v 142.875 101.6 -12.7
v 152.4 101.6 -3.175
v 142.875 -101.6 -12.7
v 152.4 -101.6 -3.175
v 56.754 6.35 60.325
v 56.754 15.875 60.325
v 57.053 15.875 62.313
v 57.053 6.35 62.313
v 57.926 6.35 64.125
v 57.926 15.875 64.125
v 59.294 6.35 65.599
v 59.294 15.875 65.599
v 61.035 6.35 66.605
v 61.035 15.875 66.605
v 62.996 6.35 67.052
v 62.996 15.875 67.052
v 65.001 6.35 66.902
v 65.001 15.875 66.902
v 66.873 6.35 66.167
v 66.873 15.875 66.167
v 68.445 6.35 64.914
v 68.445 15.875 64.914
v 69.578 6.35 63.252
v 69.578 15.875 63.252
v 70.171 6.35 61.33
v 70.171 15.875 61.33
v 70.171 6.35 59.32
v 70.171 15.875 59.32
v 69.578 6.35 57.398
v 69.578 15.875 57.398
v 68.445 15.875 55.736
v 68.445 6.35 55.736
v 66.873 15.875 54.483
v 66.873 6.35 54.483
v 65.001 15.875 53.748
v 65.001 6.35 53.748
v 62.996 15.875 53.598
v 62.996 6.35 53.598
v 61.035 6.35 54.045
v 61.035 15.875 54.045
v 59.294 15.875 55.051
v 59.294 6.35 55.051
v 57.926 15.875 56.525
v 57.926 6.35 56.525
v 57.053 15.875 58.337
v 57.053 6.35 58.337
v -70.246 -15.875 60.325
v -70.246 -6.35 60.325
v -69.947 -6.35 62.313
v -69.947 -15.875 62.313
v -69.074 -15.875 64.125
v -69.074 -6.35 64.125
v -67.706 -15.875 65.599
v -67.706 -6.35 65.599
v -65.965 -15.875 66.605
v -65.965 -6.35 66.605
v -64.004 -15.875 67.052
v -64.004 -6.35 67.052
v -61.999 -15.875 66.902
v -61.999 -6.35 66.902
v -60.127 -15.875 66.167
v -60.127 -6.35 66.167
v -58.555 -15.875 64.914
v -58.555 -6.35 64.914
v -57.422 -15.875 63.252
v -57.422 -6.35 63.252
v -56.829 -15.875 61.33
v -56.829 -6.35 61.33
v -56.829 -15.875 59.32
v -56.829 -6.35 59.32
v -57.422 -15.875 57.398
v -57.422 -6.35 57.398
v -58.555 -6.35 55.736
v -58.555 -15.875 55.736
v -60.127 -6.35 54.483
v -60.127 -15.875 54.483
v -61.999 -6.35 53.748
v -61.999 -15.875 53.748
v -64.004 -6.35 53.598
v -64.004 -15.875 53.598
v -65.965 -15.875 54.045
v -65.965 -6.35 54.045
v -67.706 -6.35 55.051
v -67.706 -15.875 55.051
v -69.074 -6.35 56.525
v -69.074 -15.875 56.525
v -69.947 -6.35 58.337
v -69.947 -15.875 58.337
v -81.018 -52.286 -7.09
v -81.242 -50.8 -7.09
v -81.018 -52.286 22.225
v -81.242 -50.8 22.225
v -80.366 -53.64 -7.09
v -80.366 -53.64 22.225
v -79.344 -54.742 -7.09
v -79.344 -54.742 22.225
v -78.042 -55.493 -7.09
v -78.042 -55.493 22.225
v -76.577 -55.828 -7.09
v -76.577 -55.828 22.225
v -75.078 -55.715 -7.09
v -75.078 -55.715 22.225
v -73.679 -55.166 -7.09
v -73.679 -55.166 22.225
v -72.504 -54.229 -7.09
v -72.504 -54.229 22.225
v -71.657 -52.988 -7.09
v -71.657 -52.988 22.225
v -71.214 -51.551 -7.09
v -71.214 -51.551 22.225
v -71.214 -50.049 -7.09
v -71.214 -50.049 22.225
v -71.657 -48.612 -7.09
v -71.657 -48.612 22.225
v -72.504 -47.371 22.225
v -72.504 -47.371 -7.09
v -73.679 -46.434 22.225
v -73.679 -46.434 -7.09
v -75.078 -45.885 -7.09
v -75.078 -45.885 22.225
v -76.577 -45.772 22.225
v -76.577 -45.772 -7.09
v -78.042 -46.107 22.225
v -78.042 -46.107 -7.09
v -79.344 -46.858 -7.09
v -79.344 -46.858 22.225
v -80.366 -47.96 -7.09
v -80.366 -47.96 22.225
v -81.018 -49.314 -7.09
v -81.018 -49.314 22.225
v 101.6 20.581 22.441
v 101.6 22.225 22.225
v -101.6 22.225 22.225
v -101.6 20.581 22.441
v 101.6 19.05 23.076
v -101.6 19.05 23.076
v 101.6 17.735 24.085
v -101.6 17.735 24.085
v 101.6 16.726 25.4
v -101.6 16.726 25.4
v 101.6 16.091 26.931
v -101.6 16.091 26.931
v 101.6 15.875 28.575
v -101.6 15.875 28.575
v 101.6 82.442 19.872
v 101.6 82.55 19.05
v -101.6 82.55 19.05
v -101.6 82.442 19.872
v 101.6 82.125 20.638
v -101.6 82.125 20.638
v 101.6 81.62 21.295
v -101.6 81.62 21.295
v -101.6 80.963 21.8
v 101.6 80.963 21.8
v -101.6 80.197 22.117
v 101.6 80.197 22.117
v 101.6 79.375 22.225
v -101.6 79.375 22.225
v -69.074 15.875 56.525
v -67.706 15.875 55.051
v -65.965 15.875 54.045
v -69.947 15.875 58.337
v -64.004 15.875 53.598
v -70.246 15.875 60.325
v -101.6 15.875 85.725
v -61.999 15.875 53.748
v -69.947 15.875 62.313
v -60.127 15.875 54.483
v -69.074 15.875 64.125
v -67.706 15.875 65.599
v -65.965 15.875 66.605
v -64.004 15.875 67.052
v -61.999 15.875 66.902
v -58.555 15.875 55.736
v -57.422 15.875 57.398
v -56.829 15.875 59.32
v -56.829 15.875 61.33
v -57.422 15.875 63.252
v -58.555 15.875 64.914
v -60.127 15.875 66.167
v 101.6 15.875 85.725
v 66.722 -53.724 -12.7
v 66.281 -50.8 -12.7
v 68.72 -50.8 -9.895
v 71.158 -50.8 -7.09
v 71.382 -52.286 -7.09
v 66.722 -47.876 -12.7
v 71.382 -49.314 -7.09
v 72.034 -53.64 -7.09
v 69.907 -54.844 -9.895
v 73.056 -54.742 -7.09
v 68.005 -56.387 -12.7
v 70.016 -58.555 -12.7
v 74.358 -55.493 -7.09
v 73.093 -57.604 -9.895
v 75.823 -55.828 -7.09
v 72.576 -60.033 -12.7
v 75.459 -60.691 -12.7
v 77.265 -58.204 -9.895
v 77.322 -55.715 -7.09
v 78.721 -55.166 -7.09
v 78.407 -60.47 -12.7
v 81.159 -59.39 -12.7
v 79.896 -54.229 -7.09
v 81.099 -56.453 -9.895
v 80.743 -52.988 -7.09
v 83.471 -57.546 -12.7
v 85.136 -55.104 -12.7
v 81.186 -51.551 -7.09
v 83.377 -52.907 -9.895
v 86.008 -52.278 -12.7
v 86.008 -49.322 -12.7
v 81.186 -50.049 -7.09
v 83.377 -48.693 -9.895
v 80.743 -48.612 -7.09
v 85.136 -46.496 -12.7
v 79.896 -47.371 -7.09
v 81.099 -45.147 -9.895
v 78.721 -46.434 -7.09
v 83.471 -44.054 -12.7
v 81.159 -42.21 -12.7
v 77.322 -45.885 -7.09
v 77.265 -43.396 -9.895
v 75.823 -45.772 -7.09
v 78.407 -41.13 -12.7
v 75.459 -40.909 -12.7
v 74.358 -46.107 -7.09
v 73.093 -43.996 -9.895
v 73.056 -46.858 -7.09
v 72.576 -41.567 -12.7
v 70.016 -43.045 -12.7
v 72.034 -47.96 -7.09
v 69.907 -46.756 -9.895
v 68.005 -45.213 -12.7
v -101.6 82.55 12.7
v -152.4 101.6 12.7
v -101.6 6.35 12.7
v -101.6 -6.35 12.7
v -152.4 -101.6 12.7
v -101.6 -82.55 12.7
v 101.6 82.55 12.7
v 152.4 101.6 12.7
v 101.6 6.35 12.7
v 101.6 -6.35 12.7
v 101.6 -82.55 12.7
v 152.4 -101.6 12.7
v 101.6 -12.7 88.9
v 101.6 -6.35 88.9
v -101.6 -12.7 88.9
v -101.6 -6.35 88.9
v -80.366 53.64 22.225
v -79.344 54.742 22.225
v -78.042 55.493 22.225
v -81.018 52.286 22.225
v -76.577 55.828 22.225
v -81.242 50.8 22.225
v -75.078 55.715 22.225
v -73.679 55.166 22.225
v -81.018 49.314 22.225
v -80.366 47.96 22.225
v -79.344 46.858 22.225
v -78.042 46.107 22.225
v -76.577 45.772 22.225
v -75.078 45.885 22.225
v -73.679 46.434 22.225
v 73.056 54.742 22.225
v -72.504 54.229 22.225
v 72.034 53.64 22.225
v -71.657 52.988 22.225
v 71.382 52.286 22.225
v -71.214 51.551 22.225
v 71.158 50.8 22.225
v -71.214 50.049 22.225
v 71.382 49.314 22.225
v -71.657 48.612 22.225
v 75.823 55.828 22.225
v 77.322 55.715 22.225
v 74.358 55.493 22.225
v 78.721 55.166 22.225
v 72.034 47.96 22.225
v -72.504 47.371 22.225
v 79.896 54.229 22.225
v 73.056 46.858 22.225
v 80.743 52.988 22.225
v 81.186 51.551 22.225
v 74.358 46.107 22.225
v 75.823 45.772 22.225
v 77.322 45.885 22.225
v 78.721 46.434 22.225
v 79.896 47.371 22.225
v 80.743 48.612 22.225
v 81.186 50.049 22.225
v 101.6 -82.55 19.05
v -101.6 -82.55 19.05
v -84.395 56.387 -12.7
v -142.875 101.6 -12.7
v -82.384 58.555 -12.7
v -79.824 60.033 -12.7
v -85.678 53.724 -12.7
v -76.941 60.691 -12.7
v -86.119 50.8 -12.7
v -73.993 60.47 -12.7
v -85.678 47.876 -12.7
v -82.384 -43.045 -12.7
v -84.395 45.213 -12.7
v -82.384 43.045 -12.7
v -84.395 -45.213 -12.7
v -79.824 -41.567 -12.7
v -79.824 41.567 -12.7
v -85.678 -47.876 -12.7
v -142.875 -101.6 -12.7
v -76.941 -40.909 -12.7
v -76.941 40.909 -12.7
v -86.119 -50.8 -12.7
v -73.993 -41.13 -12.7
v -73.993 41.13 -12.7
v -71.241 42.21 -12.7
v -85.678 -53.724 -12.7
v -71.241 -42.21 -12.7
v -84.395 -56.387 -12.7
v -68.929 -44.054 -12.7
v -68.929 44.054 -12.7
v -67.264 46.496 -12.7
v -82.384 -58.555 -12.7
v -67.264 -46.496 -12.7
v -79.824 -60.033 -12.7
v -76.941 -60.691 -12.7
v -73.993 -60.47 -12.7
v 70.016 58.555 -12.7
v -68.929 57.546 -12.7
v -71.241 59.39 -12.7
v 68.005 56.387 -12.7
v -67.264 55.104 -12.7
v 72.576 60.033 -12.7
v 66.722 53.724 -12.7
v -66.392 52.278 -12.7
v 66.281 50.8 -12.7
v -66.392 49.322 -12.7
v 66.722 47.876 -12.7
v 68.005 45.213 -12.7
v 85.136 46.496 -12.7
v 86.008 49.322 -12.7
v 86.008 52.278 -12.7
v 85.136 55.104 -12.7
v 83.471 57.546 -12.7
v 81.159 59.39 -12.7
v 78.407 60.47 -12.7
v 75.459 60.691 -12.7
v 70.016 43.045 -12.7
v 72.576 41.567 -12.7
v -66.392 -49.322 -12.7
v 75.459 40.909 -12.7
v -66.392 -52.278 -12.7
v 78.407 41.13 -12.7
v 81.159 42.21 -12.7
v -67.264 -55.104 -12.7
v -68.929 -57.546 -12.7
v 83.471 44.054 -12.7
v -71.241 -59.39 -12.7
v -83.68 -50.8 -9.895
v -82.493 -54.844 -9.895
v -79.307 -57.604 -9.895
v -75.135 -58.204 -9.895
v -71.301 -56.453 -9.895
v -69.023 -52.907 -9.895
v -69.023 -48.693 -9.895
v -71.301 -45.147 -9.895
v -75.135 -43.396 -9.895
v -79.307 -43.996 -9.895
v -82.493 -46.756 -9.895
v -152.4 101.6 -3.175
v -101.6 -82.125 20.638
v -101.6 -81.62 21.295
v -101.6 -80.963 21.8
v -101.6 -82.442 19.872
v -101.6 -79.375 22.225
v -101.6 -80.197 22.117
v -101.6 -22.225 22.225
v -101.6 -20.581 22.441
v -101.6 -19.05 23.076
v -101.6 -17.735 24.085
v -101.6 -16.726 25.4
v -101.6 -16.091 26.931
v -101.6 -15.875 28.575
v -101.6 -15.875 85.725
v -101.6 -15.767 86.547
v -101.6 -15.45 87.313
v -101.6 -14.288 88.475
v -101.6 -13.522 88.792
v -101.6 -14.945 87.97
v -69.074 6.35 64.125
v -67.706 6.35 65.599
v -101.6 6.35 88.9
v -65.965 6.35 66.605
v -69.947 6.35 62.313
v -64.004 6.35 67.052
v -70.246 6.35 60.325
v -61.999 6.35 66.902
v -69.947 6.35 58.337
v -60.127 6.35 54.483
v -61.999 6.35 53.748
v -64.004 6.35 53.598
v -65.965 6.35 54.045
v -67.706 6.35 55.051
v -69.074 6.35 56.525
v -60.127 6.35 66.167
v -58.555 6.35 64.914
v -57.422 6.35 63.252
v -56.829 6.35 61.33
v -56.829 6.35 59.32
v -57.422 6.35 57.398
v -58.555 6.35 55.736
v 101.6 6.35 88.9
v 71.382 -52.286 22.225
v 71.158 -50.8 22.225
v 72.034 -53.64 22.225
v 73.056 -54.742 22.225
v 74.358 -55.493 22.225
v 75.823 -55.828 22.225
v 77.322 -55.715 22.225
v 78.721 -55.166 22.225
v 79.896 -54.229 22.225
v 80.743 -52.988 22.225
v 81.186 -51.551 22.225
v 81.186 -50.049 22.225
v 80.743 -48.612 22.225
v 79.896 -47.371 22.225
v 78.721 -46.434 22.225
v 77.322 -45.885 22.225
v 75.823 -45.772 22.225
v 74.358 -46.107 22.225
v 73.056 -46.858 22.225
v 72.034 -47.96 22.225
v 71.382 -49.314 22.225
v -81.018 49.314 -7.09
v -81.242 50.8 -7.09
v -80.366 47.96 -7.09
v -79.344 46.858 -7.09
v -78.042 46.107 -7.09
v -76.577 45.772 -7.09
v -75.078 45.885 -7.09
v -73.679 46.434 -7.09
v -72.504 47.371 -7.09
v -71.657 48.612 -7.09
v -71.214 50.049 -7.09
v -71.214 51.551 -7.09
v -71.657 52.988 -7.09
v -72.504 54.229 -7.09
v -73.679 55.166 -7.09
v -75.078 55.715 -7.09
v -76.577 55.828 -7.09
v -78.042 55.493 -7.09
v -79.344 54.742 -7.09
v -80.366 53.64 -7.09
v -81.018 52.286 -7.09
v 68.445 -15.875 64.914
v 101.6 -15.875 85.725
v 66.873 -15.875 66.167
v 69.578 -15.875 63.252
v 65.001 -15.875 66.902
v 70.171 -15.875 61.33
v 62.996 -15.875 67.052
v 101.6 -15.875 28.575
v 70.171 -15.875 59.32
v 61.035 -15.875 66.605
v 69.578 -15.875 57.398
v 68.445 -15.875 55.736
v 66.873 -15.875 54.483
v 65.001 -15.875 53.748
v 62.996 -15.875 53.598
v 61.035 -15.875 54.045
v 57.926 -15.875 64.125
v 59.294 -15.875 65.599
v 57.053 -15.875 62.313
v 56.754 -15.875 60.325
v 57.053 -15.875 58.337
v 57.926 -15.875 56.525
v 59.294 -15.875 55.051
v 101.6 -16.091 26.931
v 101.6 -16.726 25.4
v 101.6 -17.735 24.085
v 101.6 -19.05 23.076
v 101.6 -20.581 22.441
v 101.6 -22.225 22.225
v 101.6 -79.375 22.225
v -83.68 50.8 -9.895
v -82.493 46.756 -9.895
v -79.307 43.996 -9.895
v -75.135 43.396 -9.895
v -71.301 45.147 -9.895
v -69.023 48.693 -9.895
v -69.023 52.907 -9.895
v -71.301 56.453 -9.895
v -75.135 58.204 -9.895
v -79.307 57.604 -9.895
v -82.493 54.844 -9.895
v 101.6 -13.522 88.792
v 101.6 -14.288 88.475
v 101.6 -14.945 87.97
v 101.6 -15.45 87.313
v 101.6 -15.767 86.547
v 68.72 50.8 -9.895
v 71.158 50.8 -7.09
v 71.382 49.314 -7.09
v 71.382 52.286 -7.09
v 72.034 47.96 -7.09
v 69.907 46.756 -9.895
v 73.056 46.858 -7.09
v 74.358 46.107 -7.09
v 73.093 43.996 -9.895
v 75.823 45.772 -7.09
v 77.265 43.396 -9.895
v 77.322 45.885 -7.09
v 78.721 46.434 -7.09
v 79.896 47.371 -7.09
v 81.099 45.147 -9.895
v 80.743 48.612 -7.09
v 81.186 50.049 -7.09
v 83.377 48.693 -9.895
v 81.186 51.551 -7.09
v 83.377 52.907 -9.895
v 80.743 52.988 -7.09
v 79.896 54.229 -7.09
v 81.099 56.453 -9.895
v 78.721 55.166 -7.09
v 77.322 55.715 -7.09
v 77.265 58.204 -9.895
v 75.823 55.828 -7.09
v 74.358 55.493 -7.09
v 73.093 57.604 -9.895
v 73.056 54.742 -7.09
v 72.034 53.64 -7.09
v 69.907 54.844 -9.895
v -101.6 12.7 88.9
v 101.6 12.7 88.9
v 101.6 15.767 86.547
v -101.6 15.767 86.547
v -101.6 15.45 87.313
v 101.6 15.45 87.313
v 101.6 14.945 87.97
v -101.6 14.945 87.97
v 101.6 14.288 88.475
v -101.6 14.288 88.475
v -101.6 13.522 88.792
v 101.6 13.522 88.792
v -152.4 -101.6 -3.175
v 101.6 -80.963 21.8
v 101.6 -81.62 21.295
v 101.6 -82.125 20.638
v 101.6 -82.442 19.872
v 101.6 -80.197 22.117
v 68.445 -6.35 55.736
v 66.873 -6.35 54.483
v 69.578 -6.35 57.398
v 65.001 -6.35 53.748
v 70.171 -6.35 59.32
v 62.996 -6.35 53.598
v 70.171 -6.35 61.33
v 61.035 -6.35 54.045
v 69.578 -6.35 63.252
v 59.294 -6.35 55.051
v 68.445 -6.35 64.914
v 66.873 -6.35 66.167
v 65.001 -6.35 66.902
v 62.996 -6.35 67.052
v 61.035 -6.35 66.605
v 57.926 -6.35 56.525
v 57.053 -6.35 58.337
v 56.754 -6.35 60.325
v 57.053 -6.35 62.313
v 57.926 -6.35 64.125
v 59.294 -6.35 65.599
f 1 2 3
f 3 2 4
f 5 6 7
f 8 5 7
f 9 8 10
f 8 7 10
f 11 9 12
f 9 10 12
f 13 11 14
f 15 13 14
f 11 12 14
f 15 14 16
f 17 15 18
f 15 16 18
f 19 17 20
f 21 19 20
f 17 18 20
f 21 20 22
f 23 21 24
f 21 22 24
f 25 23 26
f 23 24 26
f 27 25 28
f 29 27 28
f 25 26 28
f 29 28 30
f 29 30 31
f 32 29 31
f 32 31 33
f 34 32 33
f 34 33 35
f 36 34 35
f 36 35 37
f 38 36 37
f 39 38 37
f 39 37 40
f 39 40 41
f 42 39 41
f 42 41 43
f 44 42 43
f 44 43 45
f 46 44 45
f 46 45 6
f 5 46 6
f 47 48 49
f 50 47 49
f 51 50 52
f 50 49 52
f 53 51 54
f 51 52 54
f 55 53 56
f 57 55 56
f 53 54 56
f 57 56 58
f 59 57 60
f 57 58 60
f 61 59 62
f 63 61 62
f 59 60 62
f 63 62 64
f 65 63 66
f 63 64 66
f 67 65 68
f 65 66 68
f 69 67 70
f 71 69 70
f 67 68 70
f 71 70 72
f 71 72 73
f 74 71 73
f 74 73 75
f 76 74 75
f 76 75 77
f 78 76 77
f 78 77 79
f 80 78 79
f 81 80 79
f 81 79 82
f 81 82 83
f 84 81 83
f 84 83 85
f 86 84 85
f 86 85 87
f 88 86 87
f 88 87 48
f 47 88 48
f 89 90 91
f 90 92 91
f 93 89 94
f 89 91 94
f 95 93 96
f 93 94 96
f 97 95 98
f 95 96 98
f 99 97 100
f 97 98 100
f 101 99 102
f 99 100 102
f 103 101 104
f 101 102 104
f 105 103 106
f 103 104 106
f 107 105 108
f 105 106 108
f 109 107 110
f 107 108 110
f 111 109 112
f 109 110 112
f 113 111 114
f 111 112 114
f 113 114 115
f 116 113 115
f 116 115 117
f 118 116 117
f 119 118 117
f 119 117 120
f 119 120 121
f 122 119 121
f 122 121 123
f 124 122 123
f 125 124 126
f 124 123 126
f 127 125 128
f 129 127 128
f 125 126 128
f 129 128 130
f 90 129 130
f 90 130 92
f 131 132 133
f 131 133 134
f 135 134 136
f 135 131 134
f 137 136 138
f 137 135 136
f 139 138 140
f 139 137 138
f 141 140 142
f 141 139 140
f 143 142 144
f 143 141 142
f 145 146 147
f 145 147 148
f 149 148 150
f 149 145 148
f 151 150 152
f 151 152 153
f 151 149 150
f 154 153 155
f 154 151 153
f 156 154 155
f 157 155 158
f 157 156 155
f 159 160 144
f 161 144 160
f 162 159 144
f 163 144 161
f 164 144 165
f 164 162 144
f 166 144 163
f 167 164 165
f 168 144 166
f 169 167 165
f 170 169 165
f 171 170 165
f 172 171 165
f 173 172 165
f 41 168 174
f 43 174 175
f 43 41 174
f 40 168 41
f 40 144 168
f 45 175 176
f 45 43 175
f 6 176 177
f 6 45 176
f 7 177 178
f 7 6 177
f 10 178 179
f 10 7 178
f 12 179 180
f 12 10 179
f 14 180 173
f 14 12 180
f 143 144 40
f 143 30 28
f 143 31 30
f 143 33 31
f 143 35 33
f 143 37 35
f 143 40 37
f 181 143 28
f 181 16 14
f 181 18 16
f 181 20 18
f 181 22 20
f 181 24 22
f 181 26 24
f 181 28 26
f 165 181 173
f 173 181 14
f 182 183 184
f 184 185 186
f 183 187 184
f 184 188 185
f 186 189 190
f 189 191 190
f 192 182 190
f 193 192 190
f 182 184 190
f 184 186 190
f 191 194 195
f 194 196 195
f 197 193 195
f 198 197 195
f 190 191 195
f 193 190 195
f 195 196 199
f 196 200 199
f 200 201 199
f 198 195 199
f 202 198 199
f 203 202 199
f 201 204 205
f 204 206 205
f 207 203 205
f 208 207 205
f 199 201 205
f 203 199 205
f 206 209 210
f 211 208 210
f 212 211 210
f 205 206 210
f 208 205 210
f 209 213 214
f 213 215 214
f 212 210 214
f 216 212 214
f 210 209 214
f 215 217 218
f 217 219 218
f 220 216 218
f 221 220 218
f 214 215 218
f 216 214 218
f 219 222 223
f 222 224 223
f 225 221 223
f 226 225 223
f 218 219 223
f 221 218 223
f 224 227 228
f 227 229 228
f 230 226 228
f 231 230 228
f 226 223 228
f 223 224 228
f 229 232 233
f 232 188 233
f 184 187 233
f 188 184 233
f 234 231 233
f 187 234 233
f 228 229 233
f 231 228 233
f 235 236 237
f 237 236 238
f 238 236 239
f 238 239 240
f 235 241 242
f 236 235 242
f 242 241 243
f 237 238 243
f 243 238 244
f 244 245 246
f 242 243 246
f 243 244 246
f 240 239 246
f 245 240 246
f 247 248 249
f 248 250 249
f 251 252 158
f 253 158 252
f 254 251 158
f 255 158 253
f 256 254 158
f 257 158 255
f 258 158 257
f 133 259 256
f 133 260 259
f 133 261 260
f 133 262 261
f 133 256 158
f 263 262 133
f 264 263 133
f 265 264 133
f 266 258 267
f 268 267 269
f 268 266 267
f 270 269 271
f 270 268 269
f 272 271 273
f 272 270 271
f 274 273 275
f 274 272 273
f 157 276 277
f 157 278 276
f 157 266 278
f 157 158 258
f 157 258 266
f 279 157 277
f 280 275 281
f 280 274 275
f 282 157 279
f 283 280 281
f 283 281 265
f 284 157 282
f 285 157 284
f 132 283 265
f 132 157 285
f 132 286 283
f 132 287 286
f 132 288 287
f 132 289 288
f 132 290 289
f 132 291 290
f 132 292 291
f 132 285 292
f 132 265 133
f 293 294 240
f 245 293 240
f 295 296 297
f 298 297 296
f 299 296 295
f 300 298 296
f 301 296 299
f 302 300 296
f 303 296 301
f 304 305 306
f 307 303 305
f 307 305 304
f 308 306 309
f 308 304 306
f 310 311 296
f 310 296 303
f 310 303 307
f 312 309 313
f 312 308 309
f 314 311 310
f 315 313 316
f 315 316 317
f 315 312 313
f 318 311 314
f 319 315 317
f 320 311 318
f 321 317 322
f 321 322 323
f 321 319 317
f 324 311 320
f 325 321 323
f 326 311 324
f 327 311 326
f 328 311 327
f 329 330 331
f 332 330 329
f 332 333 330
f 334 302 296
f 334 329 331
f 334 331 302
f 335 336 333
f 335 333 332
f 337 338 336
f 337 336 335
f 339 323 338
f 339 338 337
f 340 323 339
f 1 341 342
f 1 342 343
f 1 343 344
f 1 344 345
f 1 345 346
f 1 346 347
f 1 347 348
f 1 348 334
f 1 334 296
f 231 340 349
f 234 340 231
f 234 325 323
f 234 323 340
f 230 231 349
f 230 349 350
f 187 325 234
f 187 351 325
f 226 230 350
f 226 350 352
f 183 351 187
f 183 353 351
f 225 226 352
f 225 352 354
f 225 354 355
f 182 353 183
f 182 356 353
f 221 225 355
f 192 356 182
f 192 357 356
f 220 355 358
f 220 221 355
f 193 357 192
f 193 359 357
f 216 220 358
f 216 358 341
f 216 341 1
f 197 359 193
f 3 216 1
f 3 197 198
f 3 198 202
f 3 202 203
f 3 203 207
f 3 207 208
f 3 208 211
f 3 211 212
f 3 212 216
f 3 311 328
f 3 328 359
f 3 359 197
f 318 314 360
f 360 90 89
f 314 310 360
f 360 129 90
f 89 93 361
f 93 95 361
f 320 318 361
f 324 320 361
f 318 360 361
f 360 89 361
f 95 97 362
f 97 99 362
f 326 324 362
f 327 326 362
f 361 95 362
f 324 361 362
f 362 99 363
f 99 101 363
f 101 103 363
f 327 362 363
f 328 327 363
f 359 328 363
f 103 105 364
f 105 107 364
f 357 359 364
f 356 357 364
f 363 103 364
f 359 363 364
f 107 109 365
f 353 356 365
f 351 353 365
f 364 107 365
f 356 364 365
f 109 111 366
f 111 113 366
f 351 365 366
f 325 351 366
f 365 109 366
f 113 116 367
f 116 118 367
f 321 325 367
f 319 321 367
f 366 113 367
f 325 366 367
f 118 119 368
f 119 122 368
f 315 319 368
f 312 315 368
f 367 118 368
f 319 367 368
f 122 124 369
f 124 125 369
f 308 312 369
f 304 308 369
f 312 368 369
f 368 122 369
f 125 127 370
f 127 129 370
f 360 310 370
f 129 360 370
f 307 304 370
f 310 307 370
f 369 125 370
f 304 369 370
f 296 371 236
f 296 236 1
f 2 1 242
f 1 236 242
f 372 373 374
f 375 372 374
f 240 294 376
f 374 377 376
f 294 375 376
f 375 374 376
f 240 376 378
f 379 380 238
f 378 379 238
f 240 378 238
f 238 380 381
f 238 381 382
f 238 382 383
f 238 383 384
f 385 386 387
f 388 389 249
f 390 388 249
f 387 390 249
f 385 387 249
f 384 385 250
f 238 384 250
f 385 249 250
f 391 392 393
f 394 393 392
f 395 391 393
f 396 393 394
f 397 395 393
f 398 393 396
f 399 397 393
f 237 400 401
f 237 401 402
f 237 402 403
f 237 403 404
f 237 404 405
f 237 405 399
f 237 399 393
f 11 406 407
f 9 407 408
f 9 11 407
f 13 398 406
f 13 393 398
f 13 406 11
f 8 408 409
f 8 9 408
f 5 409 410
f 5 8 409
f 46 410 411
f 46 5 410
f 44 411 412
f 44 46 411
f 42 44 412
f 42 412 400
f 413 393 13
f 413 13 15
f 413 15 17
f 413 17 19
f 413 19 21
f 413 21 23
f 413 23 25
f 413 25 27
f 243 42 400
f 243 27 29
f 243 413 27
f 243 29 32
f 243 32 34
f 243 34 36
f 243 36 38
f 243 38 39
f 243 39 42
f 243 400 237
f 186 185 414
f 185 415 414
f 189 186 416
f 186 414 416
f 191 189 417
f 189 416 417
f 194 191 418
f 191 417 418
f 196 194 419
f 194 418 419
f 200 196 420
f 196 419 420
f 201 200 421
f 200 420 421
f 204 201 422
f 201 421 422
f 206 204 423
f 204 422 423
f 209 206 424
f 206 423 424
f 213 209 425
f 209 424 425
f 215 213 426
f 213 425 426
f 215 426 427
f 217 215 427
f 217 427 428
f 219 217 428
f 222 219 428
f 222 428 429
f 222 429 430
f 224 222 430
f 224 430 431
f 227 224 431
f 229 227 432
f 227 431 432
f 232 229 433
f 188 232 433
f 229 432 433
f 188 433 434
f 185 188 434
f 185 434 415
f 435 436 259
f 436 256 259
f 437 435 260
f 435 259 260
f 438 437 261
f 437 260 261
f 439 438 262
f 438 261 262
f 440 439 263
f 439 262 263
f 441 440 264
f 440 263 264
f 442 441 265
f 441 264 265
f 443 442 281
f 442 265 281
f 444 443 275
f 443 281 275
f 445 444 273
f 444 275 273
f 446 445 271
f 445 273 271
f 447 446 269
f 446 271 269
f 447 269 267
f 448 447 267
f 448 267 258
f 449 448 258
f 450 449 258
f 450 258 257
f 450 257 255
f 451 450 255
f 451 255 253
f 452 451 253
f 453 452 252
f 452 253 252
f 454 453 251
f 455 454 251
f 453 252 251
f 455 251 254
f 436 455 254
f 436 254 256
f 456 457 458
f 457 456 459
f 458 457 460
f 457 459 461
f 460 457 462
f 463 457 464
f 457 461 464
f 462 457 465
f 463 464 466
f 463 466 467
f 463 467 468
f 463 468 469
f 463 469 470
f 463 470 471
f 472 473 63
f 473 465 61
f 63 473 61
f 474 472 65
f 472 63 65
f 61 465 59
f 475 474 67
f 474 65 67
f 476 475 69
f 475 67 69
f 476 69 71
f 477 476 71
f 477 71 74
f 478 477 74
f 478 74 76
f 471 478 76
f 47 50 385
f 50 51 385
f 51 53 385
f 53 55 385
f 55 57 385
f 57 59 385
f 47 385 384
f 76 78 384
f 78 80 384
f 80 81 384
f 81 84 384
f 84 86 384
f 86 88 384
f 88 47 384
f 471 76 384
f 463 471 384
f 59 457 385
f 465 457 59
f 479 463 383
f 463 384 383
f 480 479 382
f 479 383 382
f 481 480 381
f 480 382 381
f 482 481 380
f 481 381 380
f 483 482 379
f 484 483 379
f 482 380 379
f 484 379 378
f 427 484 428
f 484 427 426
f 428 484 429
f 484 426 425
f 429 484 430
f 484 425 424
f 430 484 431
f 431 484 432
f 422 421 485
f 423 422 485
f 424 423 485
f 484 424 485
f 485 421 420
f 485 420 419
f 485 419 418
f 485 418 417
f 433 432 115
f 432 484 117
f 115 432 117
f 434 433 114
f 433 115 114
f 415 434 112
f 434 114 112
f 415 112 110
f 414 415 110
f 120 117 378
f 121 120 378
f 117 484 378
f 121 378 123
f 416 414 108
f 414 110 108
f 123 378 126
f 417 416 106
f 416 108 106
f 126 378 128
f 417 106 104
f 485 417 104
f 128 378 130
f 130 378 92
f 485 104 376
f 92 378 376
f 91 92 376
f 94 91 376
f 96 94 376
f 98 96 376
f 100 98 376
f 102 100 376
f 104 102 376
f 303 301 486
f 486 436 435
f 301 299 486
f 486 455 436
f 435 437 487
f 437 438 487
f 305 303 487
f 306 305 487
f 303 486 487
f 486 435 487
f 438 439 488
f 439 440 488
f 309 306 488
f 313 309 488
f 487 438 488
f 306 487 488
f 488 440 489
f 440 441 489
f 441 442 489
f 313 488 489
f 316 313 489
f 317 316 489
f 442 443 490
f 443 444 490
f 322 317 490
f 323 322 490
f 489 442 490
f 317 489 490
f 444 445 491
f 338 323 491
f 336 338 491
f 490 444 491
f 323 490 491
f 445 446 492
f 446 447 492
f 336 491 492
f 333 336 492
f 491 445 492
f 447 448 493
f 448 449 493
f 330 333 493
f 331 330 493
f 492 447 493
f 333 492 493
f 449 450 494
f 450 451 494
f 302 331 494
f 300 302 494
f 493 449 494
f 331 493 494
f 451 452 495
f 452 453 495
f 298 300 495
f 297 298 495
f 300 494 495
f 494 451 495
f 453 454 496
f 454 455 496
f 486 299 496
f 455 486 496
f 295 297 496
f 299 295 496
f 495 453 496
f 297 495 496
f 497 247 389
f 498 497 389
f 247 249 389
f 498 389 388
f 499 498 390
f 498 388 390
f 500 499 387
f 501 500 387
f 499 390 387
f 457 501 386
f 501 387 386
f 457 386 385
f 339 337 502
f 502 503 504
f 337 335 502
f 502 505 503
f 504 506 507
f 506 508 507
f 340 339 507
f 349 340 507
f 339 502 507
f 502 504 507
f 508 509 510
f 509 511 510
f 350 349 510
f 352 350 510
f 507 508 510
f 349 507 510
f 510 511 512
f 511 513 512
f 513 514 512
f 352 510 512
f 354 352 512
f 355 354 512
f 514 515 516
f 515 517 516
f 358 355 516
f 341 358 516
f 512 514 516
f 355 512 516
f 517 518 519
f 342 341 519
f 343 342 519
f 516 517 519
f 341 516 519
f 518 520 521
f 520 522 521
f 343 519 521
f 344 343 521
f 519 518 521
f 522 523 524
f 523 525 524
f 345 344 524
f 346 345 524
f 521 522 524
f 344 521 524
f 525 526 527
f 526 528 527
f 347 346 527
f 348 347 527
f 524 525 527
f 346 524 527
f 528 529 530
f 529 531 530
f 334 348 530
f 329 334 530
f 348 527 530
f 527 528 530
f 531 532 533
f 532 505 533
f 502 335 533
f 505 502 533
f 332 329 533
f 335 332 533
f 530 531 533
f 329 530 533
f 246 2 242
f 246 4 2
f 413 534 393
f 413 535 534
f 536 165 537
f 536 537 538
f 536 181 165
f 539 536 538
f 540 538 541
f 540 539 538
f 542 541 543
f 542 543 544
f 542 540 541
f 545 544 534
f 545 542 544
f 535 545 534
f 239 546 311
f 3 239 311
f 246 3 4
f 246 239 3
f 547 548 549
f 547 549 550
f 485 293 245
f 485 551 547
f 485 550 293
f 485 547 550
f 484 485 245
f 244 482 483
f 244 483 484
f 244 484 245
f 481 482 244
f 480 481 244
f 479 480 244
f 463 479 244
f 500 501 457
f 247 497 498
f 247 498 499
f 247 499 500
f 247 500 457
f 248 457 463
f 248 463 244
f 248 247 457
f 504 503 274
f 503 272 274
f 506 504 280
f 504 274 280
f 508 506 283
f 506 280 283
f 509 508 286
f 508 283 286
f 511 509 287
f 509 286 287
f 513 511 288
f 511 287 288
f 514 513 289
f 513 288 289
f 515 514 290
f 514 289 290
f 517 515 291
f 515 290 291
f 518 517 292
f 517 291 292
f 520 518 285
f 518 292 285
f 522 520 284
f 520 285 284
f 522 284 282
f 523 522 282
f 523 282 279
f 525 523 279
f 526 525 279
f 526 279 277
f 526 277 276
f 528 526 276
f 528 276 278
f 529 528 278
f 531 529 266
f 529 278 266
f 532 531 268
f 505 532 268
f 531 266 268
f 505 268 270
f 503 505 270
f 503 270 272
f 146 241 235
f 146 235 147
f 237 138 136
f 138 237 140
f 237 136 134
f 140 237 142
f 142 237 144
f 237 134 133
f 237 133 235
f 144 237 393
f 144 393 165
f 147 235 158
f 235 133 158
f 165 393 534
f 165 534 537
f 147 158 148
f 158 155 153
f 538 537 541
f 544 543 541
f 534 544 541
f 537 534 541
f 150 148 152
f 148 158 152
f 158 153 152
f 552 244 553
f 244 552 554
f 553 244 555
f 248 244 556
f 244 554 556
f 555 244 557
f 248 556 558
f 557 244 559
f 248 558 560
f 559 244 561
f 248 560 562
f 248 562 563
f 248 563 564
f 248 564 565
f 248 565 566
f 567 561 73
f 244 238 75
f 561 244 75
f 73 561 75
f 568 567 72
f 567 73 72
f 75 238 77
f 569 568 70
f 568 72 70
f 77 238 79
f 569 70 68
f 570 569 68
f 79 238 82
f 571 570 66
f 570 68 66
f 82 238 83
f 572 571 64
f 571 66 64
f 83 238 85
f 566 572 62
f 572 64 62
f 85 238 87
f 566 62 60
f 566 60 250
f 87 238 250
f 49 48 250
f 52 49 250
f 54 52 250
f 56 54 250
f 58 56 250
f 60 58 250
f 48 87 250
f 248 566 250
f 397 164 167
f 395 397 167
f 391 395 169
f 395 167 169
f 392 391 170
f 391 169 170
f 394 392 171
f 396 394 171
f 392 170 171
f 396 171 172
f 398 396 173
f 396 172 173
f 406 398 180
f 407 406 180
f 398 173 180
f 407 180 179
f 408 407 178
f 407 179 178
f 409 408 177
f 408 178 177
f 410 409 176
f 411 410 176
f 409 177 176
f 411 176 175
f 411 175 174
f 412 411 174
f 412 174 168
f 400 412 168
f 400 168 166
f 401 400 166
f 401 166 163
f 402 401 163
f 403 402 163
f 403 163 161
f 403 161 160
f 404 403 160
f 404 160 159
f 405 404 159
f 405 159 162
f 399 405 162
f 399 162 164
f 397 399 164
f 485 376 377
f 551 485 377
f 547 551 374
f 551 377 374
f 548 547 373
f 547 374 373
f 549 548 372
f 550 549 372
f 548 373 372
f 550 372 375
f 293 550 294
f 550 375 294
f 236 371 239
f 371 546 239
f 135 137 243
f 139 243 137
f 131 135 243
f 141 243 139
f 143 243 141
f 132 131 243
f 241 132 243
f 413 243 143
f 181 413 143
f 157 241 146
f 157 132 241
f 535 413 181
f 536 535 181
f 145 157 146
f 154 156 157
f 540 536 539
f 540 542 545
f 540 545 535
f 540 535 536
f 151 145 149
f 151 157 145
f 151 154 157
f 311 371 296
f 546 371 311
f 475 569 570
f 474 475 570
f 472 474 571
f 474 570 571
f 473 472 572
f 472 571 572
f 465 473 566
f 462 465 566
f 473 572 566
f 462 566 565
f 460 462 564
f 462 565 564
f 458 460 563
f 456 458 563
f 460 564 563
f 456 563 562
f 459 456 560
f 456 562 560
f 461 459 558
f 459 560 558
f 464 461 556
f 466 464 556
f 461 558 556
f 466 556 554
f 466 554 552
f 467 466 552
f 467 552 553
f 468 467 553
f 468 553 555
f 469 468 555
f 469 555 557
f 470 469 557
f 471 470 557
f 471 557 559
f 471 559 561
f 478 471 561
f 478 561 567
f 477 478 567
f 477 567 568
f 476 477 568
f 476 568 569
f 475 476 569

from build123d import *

# Parameters (mm, degrees)
F0_W           = 304.8
F0_H           = 25.4
F1_DEPTH       = 101.6
F3_DEPTH       = 101.6
F5_D           = 10.0838
F5_CSINK_D     = 19.8374
F5_CSINK_ANGLE = 82
F7_D           = 13.49248
F8_SIZE        = 9.525
F9_SIZE        = 9.525


with BuildPart() as f1:
    # F0 (on Front) → F1 (new body, symmetric)
    with BuildSketch(Plane.XZ):
        Rectangle(F0_W, F0_H)
    extrude(amount=F1_DEPTH, both=True)

    # F2 (on Right) → F3 (join, symmetric)
    with BuildSketch(Plane.YZ):
        with BuildLine():
            Line((-82.55, 19.05), (-82.55, 12.7))
            Line((-82.55, 12.7), (-6.35, 12.7))
            Line((-6.35, 12.7), (-6.35, 88.9))
            Line((-6.35, 88.9), (-12.7, 88.9))
            ThreePointArc((-12.7, 88.9), (-14.9450640303, 87.9700640303), (-15.875, 85.725))
            Line((-15.875, 85.725), (-15.875, 28.575))
            ThreePointArc((-15.875, 28.575), (-17.7348719395, 24.0848719395), (-22.225, 22.225))
            Line((-22.225, 22.225), (-79.375, 22.225))
            ThreePointArc((-79.375, 22.225), (-81.6200640303, 21.2950640303), (-82.55, 19.05))
        make_face()
        with BuildLine():
            Line((6.35, 88.9), (6.35, 12.7))
            Line((6.35, 12.7), (82.55, 12.7))
            Line((82.55, 12.7), (82.55, 19.05))
            ThreePointArc((82.55, 19.05), (81.6200640303, 21.2950640303), (79.375, 22.225))
            Line((79.375, 22.225), (22.225, 22.225))
            ThreePointArc((22.225, 22.225), (17.7348719395, 24.0848719395), (15.875, 28.575))
            Line((15.875, 28.575), (15.875, 85.725))
            ThreePointArc((15.875, 85.725), (14.9450640303, 87.9700640303), (12.7, 88.9))
            Line((12.7, 88.9), (6.35, 88.9))
        make_face()
    extrude(amount=F3_DEPTH, both=True)

    # F5 (through all)
    with Locations(Plane(origin=(0, 0, -12.7), x_dir=(1, 0, 0), z_dir=(0, 0, -1))):
        with Locations((-76.2, 50.8), (76.2, 50.8), (76.2, -50.8), (-76.2, -50.8)):
            CounterSinkHole(F5_D / 2, F5_CSINK_D / 2, counter_sink_angle=F5_CSINK_ANGLE)

    # F7 (through all)
    with Locations(Plane.XZ.offset(15.875)):
        with Locations((-63.5, 60.325), (63.5, 60.325)):
            Hole(F7_D / 2)

    # F8
    f8_edges = [f1.edges().sort_by_distance(p)[0] for p in [
        (152.4, 0, -12.7),
    ]]
    chamfer(f8_edges, length=F8_SIZE)

    # F9
    f9_edges = [f1.edges().sort_by_distance(p)[0] for p in [
        (-152.4, 0, -12.7),
    ]]
    chamfer(f9_edges, length=F9_SIZE)


solid = f1.part
